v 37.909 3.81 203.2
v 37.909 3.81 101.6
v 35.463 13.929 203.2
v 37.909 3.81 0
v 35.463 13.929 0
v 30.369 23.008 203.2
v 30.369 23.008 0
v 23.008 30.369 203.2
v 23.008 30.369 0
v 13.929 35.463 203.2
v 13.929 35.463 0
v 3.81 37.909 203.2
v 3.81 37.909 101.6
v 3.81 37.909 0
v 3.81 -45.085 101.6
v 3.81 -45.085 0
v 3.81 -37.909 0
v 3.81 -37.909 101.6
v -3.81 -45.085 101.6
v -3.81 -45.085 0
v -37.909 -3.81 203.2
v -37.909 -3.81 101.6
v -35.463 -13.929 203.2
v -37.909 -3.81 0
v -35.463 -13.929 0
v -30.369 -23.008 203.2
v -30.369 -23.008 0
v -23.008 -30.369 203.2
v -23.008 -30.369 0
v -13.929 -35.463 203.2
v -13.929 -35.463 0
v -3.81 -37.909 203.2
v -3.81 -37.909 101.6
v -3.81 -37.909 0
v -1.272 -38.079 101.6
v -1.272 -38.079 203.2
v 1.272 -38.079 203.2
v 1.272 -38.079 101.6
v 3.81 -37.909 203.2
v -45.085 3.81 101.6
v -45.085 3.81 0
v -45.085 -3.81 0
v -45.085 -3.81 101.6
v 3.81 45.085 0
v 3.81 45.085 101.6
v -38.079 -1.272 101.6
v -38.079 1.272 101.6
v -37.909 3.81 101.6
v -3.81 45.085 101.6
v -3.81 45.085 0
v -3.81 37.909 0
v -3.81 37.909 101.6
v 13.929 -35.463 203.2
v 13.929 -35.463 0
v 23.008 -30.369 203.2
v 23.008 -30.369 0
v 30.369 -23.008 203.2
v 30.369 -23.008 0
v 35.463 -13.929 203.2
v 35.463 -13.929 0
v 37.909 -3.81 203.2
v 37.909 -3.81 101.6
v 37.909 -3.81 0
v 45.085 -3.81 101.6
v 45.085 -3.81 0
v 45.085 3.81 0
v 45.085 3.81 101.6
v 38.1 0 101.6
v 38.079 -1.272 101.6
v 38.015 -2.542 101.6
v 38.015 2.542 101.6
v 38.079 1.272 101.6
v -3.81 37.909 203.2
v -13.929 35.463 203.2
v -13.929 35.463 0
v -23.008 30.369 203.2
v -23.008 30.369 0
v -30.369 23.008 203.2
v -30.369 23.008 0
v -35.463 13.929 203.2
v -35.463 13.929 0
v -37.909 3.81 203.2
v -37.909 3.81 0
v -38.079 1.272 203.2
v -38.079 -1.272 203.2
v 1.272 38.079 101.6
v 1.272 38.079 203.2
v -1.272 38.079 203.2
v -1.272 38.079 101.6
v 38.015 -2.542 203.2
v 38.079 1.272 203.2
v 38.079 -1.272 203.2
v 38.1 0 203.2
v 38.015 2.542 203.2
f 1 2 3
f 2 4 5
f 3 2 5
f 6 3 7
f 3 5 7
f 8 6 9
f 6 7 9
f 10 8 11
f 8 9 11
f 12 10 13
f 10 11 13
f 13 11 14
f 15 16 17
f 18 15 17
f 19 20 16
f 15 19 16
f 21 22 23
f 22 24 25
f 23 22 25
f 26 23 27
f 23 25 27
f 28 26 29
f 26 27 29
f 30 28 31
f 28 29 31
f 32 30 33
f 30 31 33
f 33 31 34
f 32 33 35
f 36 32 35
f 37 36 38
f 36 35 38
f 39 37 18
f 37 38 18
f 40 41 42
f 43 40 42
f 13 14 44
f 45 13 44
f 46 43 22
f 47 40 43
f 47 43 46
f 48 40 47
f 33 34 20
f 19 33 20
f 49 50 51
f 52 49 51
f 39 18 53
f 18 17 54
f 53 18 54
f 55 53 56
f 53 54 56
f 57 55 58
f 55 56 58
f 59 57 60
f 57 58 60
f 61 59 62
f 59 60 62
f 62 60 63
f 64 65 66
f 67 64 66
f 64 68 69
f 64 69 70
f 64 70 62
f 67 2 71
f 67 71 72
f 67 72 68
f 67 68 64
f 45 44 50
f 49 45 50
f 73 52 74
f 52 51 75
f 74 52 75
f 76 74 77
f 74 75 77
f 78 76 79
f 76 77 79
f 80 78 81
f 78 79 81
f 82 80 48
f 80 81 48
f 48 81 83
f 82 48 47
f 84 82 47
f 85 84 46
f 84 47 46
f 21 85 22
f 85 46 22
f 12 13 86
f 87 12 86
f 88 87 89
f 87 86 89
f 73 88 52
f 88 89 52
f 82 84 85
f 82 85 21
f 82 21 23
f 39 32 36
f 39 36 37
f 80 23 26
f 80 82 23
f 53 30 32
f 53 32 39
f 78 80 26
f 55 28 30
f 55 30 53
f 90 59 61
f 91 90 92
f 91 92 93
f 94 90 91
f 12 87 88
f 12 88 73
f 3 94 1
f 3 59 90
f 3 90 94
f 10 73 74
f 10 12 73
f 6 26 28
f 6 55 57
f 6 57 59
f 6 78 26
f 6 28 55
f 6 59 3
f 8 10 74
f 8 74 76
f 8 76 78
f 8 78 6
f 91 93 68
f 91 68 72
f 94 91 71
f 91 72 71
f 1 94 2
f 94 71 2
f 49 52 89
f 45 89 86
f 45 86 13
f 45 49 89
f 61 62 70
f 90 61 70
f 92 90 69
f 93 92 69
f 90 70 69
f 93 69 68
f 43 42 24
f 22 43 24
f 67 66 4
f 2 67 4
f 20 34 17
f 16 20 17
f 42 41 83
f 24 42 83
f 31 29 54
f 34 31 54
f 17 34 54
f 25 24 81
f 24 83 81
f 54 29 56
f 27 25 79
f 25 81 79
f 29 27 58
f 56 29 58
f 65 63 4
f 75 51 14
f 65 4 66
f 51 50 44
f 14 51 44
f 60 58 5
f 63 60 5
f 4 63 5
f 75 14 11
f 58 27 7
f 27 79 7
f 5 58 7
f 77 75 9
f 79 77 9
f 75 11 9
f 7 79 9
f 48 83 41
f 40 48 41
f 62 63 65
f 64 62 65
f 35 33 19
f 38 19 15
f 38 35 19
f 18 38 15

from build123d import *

# Parameters (mm, degrees)
F1_DEPTH = 203.2
F2_DEPTH = 101.6


with BuildPart() as f1:
    # F0 (on Top) → F1 (new body)
    with BuildSketch(Plane.XY):
        with BuildLine():
            ThreePointArc((37.909021, -3.81), (38.052225, -1.907392), (38.1, 0))
            ThreePointArc((38.1, 0), (38.052225, 1.907392), (37.909021, 3.81))
            Line((37.909021, 3.81), (31.115, 3.81))
            Line((31.115, 3.81), (31.115, -3.81))
            Line((31.115, -3.81), (37.909021, -3.81))
        make_face()
        with BuildLine():
            Line((-31.115, 3.81), (-37.909021, 3.81))
            ThreePointArc((-37.909021, 3.81), (-38.1, 0), (-37.909021, -3.81))
            Line((-37.909021, -3.81), (-31.115, -3.81))
            Line((-31.115, -3.81), (-31.115, 3.81))
        make_face()
        with BuildLine():
            Line((3.81, 31.115), (3.81, 37.909021))
            ThreePointArc((3.81, 37.909021), (0, 38.1), (-3.81, 37.909021))
            Line((-3.81, 37.909021), (-3.81, 31.115))
            Line((-3.81, 31.115), (3.81, 31.115))
        make_face()
        with BuildLine():
            ThreePointArc((-3.81, -37.909021), (0, -38.1), (3.81, -37.909021))
            Line((3.81, -37.909021), (3.81, -31.115))
            Line((3.81, -31.115), (-3.81, -31.115))
            Line((-3.81, -31.115), (-3.81, -37.909021))
        make_face()
        with BuildLine():
            Line((31.115, 3.81), (37.909021, 3.81))
            ThreePointArc((37.909021, 3.81), (26.940768, 26.940768), (3.81, 37.909021))
            Line((3.81, 37.909021), (3.81, 31.115))
            Line((3.81, 31.115), (-3.81, 31.115))
            Line((-3.81, 31.115), (-3.81, 37.909021))
            ThreePointArc((-3.81, 37.909021), (-26.940768, 26.940768), (-37.909021, 3.81))
            Line((-37.909021, 3.81), (-31.115, 3.81))
            Line((-31.115, 3.81), (-31.115, -3.81))
            Line((-31.115, -3.81), (-37.909021, -3.81))
            ThreePointArc((-37.909021, -3.81), (-26.940768, -26.940768), (-3.81, -37.909021))
            Line((-3.81, -37.909021), (-3.81, -31.115))
            Line((-3.81, -31.115), (3.81, -31.115))
            Line((3.81, -31.115), (3.81, -37.909021))
            ThreePointArc((3.81, -37.909021), (26.940768, -26.940768), (37.909021, -3.81))
            Line((37.909021, -3.81), (31.115, -3.81))
            Line((31.115, -3.81), (31.115, 3.81))
        make_face()
    extrude(amount=F1_DEPTH)

    # F0 (on Top) → F2 (join)
    with BuildSketch(Plane.XY):
        with BuildLine():
            ThreePointArc((-37.909021, -3.81), (-38.1, 0), (-37.909021, 3.81))
            Line((-37.909021, 3.81), (-45.085, 3.81))
            Line((-45.085, 3.81), (-45.085, -3.81))
            Line((-45.085, -3.81), (-37.909021, -3.81))
        make_face()
        with BuildLine():
            Line((3.81, -45.085), (3.81, -37.909021))
            ThreePointArc((3.81, -37.909021), (0, -38.1), (-3.81, -37.909021))
            Line((-3.81, -37.909021), (-3.81, -45.085))
            Line((-3.81, -45.085), (3.81, -45.085))
        make_face()
        with BuildLine():
            ThreePointArc((37.909021, 3.81), (38.052225, 1.907392), (38.1, 0))
            ThreePointArc((38.1, 0), (38.052225, -1.907392), (37.909021, -3.81))
            Line((37.909021, -3.81), (45.085, -3.81))
            Line((45.085, -3.81), (45.085, 3.81))
            Line((45.085, 3.81), (37.909021, 3.81))
        make_face()
        with BuildLine():
            ThreePointArc((-3.81, 37.909021), (0, 38.1), (3.81, 37.909021))
            Line((3.81, 37.909021), (3.81, 45.085))
            Line((3.81, 45.085), (-3.81, 45.085))
            Line((-3.81, 45.085), (-3.81, 37.909021))
        make_face()
    extrude(amount=F2_DEPTH)


solid = f1.part
